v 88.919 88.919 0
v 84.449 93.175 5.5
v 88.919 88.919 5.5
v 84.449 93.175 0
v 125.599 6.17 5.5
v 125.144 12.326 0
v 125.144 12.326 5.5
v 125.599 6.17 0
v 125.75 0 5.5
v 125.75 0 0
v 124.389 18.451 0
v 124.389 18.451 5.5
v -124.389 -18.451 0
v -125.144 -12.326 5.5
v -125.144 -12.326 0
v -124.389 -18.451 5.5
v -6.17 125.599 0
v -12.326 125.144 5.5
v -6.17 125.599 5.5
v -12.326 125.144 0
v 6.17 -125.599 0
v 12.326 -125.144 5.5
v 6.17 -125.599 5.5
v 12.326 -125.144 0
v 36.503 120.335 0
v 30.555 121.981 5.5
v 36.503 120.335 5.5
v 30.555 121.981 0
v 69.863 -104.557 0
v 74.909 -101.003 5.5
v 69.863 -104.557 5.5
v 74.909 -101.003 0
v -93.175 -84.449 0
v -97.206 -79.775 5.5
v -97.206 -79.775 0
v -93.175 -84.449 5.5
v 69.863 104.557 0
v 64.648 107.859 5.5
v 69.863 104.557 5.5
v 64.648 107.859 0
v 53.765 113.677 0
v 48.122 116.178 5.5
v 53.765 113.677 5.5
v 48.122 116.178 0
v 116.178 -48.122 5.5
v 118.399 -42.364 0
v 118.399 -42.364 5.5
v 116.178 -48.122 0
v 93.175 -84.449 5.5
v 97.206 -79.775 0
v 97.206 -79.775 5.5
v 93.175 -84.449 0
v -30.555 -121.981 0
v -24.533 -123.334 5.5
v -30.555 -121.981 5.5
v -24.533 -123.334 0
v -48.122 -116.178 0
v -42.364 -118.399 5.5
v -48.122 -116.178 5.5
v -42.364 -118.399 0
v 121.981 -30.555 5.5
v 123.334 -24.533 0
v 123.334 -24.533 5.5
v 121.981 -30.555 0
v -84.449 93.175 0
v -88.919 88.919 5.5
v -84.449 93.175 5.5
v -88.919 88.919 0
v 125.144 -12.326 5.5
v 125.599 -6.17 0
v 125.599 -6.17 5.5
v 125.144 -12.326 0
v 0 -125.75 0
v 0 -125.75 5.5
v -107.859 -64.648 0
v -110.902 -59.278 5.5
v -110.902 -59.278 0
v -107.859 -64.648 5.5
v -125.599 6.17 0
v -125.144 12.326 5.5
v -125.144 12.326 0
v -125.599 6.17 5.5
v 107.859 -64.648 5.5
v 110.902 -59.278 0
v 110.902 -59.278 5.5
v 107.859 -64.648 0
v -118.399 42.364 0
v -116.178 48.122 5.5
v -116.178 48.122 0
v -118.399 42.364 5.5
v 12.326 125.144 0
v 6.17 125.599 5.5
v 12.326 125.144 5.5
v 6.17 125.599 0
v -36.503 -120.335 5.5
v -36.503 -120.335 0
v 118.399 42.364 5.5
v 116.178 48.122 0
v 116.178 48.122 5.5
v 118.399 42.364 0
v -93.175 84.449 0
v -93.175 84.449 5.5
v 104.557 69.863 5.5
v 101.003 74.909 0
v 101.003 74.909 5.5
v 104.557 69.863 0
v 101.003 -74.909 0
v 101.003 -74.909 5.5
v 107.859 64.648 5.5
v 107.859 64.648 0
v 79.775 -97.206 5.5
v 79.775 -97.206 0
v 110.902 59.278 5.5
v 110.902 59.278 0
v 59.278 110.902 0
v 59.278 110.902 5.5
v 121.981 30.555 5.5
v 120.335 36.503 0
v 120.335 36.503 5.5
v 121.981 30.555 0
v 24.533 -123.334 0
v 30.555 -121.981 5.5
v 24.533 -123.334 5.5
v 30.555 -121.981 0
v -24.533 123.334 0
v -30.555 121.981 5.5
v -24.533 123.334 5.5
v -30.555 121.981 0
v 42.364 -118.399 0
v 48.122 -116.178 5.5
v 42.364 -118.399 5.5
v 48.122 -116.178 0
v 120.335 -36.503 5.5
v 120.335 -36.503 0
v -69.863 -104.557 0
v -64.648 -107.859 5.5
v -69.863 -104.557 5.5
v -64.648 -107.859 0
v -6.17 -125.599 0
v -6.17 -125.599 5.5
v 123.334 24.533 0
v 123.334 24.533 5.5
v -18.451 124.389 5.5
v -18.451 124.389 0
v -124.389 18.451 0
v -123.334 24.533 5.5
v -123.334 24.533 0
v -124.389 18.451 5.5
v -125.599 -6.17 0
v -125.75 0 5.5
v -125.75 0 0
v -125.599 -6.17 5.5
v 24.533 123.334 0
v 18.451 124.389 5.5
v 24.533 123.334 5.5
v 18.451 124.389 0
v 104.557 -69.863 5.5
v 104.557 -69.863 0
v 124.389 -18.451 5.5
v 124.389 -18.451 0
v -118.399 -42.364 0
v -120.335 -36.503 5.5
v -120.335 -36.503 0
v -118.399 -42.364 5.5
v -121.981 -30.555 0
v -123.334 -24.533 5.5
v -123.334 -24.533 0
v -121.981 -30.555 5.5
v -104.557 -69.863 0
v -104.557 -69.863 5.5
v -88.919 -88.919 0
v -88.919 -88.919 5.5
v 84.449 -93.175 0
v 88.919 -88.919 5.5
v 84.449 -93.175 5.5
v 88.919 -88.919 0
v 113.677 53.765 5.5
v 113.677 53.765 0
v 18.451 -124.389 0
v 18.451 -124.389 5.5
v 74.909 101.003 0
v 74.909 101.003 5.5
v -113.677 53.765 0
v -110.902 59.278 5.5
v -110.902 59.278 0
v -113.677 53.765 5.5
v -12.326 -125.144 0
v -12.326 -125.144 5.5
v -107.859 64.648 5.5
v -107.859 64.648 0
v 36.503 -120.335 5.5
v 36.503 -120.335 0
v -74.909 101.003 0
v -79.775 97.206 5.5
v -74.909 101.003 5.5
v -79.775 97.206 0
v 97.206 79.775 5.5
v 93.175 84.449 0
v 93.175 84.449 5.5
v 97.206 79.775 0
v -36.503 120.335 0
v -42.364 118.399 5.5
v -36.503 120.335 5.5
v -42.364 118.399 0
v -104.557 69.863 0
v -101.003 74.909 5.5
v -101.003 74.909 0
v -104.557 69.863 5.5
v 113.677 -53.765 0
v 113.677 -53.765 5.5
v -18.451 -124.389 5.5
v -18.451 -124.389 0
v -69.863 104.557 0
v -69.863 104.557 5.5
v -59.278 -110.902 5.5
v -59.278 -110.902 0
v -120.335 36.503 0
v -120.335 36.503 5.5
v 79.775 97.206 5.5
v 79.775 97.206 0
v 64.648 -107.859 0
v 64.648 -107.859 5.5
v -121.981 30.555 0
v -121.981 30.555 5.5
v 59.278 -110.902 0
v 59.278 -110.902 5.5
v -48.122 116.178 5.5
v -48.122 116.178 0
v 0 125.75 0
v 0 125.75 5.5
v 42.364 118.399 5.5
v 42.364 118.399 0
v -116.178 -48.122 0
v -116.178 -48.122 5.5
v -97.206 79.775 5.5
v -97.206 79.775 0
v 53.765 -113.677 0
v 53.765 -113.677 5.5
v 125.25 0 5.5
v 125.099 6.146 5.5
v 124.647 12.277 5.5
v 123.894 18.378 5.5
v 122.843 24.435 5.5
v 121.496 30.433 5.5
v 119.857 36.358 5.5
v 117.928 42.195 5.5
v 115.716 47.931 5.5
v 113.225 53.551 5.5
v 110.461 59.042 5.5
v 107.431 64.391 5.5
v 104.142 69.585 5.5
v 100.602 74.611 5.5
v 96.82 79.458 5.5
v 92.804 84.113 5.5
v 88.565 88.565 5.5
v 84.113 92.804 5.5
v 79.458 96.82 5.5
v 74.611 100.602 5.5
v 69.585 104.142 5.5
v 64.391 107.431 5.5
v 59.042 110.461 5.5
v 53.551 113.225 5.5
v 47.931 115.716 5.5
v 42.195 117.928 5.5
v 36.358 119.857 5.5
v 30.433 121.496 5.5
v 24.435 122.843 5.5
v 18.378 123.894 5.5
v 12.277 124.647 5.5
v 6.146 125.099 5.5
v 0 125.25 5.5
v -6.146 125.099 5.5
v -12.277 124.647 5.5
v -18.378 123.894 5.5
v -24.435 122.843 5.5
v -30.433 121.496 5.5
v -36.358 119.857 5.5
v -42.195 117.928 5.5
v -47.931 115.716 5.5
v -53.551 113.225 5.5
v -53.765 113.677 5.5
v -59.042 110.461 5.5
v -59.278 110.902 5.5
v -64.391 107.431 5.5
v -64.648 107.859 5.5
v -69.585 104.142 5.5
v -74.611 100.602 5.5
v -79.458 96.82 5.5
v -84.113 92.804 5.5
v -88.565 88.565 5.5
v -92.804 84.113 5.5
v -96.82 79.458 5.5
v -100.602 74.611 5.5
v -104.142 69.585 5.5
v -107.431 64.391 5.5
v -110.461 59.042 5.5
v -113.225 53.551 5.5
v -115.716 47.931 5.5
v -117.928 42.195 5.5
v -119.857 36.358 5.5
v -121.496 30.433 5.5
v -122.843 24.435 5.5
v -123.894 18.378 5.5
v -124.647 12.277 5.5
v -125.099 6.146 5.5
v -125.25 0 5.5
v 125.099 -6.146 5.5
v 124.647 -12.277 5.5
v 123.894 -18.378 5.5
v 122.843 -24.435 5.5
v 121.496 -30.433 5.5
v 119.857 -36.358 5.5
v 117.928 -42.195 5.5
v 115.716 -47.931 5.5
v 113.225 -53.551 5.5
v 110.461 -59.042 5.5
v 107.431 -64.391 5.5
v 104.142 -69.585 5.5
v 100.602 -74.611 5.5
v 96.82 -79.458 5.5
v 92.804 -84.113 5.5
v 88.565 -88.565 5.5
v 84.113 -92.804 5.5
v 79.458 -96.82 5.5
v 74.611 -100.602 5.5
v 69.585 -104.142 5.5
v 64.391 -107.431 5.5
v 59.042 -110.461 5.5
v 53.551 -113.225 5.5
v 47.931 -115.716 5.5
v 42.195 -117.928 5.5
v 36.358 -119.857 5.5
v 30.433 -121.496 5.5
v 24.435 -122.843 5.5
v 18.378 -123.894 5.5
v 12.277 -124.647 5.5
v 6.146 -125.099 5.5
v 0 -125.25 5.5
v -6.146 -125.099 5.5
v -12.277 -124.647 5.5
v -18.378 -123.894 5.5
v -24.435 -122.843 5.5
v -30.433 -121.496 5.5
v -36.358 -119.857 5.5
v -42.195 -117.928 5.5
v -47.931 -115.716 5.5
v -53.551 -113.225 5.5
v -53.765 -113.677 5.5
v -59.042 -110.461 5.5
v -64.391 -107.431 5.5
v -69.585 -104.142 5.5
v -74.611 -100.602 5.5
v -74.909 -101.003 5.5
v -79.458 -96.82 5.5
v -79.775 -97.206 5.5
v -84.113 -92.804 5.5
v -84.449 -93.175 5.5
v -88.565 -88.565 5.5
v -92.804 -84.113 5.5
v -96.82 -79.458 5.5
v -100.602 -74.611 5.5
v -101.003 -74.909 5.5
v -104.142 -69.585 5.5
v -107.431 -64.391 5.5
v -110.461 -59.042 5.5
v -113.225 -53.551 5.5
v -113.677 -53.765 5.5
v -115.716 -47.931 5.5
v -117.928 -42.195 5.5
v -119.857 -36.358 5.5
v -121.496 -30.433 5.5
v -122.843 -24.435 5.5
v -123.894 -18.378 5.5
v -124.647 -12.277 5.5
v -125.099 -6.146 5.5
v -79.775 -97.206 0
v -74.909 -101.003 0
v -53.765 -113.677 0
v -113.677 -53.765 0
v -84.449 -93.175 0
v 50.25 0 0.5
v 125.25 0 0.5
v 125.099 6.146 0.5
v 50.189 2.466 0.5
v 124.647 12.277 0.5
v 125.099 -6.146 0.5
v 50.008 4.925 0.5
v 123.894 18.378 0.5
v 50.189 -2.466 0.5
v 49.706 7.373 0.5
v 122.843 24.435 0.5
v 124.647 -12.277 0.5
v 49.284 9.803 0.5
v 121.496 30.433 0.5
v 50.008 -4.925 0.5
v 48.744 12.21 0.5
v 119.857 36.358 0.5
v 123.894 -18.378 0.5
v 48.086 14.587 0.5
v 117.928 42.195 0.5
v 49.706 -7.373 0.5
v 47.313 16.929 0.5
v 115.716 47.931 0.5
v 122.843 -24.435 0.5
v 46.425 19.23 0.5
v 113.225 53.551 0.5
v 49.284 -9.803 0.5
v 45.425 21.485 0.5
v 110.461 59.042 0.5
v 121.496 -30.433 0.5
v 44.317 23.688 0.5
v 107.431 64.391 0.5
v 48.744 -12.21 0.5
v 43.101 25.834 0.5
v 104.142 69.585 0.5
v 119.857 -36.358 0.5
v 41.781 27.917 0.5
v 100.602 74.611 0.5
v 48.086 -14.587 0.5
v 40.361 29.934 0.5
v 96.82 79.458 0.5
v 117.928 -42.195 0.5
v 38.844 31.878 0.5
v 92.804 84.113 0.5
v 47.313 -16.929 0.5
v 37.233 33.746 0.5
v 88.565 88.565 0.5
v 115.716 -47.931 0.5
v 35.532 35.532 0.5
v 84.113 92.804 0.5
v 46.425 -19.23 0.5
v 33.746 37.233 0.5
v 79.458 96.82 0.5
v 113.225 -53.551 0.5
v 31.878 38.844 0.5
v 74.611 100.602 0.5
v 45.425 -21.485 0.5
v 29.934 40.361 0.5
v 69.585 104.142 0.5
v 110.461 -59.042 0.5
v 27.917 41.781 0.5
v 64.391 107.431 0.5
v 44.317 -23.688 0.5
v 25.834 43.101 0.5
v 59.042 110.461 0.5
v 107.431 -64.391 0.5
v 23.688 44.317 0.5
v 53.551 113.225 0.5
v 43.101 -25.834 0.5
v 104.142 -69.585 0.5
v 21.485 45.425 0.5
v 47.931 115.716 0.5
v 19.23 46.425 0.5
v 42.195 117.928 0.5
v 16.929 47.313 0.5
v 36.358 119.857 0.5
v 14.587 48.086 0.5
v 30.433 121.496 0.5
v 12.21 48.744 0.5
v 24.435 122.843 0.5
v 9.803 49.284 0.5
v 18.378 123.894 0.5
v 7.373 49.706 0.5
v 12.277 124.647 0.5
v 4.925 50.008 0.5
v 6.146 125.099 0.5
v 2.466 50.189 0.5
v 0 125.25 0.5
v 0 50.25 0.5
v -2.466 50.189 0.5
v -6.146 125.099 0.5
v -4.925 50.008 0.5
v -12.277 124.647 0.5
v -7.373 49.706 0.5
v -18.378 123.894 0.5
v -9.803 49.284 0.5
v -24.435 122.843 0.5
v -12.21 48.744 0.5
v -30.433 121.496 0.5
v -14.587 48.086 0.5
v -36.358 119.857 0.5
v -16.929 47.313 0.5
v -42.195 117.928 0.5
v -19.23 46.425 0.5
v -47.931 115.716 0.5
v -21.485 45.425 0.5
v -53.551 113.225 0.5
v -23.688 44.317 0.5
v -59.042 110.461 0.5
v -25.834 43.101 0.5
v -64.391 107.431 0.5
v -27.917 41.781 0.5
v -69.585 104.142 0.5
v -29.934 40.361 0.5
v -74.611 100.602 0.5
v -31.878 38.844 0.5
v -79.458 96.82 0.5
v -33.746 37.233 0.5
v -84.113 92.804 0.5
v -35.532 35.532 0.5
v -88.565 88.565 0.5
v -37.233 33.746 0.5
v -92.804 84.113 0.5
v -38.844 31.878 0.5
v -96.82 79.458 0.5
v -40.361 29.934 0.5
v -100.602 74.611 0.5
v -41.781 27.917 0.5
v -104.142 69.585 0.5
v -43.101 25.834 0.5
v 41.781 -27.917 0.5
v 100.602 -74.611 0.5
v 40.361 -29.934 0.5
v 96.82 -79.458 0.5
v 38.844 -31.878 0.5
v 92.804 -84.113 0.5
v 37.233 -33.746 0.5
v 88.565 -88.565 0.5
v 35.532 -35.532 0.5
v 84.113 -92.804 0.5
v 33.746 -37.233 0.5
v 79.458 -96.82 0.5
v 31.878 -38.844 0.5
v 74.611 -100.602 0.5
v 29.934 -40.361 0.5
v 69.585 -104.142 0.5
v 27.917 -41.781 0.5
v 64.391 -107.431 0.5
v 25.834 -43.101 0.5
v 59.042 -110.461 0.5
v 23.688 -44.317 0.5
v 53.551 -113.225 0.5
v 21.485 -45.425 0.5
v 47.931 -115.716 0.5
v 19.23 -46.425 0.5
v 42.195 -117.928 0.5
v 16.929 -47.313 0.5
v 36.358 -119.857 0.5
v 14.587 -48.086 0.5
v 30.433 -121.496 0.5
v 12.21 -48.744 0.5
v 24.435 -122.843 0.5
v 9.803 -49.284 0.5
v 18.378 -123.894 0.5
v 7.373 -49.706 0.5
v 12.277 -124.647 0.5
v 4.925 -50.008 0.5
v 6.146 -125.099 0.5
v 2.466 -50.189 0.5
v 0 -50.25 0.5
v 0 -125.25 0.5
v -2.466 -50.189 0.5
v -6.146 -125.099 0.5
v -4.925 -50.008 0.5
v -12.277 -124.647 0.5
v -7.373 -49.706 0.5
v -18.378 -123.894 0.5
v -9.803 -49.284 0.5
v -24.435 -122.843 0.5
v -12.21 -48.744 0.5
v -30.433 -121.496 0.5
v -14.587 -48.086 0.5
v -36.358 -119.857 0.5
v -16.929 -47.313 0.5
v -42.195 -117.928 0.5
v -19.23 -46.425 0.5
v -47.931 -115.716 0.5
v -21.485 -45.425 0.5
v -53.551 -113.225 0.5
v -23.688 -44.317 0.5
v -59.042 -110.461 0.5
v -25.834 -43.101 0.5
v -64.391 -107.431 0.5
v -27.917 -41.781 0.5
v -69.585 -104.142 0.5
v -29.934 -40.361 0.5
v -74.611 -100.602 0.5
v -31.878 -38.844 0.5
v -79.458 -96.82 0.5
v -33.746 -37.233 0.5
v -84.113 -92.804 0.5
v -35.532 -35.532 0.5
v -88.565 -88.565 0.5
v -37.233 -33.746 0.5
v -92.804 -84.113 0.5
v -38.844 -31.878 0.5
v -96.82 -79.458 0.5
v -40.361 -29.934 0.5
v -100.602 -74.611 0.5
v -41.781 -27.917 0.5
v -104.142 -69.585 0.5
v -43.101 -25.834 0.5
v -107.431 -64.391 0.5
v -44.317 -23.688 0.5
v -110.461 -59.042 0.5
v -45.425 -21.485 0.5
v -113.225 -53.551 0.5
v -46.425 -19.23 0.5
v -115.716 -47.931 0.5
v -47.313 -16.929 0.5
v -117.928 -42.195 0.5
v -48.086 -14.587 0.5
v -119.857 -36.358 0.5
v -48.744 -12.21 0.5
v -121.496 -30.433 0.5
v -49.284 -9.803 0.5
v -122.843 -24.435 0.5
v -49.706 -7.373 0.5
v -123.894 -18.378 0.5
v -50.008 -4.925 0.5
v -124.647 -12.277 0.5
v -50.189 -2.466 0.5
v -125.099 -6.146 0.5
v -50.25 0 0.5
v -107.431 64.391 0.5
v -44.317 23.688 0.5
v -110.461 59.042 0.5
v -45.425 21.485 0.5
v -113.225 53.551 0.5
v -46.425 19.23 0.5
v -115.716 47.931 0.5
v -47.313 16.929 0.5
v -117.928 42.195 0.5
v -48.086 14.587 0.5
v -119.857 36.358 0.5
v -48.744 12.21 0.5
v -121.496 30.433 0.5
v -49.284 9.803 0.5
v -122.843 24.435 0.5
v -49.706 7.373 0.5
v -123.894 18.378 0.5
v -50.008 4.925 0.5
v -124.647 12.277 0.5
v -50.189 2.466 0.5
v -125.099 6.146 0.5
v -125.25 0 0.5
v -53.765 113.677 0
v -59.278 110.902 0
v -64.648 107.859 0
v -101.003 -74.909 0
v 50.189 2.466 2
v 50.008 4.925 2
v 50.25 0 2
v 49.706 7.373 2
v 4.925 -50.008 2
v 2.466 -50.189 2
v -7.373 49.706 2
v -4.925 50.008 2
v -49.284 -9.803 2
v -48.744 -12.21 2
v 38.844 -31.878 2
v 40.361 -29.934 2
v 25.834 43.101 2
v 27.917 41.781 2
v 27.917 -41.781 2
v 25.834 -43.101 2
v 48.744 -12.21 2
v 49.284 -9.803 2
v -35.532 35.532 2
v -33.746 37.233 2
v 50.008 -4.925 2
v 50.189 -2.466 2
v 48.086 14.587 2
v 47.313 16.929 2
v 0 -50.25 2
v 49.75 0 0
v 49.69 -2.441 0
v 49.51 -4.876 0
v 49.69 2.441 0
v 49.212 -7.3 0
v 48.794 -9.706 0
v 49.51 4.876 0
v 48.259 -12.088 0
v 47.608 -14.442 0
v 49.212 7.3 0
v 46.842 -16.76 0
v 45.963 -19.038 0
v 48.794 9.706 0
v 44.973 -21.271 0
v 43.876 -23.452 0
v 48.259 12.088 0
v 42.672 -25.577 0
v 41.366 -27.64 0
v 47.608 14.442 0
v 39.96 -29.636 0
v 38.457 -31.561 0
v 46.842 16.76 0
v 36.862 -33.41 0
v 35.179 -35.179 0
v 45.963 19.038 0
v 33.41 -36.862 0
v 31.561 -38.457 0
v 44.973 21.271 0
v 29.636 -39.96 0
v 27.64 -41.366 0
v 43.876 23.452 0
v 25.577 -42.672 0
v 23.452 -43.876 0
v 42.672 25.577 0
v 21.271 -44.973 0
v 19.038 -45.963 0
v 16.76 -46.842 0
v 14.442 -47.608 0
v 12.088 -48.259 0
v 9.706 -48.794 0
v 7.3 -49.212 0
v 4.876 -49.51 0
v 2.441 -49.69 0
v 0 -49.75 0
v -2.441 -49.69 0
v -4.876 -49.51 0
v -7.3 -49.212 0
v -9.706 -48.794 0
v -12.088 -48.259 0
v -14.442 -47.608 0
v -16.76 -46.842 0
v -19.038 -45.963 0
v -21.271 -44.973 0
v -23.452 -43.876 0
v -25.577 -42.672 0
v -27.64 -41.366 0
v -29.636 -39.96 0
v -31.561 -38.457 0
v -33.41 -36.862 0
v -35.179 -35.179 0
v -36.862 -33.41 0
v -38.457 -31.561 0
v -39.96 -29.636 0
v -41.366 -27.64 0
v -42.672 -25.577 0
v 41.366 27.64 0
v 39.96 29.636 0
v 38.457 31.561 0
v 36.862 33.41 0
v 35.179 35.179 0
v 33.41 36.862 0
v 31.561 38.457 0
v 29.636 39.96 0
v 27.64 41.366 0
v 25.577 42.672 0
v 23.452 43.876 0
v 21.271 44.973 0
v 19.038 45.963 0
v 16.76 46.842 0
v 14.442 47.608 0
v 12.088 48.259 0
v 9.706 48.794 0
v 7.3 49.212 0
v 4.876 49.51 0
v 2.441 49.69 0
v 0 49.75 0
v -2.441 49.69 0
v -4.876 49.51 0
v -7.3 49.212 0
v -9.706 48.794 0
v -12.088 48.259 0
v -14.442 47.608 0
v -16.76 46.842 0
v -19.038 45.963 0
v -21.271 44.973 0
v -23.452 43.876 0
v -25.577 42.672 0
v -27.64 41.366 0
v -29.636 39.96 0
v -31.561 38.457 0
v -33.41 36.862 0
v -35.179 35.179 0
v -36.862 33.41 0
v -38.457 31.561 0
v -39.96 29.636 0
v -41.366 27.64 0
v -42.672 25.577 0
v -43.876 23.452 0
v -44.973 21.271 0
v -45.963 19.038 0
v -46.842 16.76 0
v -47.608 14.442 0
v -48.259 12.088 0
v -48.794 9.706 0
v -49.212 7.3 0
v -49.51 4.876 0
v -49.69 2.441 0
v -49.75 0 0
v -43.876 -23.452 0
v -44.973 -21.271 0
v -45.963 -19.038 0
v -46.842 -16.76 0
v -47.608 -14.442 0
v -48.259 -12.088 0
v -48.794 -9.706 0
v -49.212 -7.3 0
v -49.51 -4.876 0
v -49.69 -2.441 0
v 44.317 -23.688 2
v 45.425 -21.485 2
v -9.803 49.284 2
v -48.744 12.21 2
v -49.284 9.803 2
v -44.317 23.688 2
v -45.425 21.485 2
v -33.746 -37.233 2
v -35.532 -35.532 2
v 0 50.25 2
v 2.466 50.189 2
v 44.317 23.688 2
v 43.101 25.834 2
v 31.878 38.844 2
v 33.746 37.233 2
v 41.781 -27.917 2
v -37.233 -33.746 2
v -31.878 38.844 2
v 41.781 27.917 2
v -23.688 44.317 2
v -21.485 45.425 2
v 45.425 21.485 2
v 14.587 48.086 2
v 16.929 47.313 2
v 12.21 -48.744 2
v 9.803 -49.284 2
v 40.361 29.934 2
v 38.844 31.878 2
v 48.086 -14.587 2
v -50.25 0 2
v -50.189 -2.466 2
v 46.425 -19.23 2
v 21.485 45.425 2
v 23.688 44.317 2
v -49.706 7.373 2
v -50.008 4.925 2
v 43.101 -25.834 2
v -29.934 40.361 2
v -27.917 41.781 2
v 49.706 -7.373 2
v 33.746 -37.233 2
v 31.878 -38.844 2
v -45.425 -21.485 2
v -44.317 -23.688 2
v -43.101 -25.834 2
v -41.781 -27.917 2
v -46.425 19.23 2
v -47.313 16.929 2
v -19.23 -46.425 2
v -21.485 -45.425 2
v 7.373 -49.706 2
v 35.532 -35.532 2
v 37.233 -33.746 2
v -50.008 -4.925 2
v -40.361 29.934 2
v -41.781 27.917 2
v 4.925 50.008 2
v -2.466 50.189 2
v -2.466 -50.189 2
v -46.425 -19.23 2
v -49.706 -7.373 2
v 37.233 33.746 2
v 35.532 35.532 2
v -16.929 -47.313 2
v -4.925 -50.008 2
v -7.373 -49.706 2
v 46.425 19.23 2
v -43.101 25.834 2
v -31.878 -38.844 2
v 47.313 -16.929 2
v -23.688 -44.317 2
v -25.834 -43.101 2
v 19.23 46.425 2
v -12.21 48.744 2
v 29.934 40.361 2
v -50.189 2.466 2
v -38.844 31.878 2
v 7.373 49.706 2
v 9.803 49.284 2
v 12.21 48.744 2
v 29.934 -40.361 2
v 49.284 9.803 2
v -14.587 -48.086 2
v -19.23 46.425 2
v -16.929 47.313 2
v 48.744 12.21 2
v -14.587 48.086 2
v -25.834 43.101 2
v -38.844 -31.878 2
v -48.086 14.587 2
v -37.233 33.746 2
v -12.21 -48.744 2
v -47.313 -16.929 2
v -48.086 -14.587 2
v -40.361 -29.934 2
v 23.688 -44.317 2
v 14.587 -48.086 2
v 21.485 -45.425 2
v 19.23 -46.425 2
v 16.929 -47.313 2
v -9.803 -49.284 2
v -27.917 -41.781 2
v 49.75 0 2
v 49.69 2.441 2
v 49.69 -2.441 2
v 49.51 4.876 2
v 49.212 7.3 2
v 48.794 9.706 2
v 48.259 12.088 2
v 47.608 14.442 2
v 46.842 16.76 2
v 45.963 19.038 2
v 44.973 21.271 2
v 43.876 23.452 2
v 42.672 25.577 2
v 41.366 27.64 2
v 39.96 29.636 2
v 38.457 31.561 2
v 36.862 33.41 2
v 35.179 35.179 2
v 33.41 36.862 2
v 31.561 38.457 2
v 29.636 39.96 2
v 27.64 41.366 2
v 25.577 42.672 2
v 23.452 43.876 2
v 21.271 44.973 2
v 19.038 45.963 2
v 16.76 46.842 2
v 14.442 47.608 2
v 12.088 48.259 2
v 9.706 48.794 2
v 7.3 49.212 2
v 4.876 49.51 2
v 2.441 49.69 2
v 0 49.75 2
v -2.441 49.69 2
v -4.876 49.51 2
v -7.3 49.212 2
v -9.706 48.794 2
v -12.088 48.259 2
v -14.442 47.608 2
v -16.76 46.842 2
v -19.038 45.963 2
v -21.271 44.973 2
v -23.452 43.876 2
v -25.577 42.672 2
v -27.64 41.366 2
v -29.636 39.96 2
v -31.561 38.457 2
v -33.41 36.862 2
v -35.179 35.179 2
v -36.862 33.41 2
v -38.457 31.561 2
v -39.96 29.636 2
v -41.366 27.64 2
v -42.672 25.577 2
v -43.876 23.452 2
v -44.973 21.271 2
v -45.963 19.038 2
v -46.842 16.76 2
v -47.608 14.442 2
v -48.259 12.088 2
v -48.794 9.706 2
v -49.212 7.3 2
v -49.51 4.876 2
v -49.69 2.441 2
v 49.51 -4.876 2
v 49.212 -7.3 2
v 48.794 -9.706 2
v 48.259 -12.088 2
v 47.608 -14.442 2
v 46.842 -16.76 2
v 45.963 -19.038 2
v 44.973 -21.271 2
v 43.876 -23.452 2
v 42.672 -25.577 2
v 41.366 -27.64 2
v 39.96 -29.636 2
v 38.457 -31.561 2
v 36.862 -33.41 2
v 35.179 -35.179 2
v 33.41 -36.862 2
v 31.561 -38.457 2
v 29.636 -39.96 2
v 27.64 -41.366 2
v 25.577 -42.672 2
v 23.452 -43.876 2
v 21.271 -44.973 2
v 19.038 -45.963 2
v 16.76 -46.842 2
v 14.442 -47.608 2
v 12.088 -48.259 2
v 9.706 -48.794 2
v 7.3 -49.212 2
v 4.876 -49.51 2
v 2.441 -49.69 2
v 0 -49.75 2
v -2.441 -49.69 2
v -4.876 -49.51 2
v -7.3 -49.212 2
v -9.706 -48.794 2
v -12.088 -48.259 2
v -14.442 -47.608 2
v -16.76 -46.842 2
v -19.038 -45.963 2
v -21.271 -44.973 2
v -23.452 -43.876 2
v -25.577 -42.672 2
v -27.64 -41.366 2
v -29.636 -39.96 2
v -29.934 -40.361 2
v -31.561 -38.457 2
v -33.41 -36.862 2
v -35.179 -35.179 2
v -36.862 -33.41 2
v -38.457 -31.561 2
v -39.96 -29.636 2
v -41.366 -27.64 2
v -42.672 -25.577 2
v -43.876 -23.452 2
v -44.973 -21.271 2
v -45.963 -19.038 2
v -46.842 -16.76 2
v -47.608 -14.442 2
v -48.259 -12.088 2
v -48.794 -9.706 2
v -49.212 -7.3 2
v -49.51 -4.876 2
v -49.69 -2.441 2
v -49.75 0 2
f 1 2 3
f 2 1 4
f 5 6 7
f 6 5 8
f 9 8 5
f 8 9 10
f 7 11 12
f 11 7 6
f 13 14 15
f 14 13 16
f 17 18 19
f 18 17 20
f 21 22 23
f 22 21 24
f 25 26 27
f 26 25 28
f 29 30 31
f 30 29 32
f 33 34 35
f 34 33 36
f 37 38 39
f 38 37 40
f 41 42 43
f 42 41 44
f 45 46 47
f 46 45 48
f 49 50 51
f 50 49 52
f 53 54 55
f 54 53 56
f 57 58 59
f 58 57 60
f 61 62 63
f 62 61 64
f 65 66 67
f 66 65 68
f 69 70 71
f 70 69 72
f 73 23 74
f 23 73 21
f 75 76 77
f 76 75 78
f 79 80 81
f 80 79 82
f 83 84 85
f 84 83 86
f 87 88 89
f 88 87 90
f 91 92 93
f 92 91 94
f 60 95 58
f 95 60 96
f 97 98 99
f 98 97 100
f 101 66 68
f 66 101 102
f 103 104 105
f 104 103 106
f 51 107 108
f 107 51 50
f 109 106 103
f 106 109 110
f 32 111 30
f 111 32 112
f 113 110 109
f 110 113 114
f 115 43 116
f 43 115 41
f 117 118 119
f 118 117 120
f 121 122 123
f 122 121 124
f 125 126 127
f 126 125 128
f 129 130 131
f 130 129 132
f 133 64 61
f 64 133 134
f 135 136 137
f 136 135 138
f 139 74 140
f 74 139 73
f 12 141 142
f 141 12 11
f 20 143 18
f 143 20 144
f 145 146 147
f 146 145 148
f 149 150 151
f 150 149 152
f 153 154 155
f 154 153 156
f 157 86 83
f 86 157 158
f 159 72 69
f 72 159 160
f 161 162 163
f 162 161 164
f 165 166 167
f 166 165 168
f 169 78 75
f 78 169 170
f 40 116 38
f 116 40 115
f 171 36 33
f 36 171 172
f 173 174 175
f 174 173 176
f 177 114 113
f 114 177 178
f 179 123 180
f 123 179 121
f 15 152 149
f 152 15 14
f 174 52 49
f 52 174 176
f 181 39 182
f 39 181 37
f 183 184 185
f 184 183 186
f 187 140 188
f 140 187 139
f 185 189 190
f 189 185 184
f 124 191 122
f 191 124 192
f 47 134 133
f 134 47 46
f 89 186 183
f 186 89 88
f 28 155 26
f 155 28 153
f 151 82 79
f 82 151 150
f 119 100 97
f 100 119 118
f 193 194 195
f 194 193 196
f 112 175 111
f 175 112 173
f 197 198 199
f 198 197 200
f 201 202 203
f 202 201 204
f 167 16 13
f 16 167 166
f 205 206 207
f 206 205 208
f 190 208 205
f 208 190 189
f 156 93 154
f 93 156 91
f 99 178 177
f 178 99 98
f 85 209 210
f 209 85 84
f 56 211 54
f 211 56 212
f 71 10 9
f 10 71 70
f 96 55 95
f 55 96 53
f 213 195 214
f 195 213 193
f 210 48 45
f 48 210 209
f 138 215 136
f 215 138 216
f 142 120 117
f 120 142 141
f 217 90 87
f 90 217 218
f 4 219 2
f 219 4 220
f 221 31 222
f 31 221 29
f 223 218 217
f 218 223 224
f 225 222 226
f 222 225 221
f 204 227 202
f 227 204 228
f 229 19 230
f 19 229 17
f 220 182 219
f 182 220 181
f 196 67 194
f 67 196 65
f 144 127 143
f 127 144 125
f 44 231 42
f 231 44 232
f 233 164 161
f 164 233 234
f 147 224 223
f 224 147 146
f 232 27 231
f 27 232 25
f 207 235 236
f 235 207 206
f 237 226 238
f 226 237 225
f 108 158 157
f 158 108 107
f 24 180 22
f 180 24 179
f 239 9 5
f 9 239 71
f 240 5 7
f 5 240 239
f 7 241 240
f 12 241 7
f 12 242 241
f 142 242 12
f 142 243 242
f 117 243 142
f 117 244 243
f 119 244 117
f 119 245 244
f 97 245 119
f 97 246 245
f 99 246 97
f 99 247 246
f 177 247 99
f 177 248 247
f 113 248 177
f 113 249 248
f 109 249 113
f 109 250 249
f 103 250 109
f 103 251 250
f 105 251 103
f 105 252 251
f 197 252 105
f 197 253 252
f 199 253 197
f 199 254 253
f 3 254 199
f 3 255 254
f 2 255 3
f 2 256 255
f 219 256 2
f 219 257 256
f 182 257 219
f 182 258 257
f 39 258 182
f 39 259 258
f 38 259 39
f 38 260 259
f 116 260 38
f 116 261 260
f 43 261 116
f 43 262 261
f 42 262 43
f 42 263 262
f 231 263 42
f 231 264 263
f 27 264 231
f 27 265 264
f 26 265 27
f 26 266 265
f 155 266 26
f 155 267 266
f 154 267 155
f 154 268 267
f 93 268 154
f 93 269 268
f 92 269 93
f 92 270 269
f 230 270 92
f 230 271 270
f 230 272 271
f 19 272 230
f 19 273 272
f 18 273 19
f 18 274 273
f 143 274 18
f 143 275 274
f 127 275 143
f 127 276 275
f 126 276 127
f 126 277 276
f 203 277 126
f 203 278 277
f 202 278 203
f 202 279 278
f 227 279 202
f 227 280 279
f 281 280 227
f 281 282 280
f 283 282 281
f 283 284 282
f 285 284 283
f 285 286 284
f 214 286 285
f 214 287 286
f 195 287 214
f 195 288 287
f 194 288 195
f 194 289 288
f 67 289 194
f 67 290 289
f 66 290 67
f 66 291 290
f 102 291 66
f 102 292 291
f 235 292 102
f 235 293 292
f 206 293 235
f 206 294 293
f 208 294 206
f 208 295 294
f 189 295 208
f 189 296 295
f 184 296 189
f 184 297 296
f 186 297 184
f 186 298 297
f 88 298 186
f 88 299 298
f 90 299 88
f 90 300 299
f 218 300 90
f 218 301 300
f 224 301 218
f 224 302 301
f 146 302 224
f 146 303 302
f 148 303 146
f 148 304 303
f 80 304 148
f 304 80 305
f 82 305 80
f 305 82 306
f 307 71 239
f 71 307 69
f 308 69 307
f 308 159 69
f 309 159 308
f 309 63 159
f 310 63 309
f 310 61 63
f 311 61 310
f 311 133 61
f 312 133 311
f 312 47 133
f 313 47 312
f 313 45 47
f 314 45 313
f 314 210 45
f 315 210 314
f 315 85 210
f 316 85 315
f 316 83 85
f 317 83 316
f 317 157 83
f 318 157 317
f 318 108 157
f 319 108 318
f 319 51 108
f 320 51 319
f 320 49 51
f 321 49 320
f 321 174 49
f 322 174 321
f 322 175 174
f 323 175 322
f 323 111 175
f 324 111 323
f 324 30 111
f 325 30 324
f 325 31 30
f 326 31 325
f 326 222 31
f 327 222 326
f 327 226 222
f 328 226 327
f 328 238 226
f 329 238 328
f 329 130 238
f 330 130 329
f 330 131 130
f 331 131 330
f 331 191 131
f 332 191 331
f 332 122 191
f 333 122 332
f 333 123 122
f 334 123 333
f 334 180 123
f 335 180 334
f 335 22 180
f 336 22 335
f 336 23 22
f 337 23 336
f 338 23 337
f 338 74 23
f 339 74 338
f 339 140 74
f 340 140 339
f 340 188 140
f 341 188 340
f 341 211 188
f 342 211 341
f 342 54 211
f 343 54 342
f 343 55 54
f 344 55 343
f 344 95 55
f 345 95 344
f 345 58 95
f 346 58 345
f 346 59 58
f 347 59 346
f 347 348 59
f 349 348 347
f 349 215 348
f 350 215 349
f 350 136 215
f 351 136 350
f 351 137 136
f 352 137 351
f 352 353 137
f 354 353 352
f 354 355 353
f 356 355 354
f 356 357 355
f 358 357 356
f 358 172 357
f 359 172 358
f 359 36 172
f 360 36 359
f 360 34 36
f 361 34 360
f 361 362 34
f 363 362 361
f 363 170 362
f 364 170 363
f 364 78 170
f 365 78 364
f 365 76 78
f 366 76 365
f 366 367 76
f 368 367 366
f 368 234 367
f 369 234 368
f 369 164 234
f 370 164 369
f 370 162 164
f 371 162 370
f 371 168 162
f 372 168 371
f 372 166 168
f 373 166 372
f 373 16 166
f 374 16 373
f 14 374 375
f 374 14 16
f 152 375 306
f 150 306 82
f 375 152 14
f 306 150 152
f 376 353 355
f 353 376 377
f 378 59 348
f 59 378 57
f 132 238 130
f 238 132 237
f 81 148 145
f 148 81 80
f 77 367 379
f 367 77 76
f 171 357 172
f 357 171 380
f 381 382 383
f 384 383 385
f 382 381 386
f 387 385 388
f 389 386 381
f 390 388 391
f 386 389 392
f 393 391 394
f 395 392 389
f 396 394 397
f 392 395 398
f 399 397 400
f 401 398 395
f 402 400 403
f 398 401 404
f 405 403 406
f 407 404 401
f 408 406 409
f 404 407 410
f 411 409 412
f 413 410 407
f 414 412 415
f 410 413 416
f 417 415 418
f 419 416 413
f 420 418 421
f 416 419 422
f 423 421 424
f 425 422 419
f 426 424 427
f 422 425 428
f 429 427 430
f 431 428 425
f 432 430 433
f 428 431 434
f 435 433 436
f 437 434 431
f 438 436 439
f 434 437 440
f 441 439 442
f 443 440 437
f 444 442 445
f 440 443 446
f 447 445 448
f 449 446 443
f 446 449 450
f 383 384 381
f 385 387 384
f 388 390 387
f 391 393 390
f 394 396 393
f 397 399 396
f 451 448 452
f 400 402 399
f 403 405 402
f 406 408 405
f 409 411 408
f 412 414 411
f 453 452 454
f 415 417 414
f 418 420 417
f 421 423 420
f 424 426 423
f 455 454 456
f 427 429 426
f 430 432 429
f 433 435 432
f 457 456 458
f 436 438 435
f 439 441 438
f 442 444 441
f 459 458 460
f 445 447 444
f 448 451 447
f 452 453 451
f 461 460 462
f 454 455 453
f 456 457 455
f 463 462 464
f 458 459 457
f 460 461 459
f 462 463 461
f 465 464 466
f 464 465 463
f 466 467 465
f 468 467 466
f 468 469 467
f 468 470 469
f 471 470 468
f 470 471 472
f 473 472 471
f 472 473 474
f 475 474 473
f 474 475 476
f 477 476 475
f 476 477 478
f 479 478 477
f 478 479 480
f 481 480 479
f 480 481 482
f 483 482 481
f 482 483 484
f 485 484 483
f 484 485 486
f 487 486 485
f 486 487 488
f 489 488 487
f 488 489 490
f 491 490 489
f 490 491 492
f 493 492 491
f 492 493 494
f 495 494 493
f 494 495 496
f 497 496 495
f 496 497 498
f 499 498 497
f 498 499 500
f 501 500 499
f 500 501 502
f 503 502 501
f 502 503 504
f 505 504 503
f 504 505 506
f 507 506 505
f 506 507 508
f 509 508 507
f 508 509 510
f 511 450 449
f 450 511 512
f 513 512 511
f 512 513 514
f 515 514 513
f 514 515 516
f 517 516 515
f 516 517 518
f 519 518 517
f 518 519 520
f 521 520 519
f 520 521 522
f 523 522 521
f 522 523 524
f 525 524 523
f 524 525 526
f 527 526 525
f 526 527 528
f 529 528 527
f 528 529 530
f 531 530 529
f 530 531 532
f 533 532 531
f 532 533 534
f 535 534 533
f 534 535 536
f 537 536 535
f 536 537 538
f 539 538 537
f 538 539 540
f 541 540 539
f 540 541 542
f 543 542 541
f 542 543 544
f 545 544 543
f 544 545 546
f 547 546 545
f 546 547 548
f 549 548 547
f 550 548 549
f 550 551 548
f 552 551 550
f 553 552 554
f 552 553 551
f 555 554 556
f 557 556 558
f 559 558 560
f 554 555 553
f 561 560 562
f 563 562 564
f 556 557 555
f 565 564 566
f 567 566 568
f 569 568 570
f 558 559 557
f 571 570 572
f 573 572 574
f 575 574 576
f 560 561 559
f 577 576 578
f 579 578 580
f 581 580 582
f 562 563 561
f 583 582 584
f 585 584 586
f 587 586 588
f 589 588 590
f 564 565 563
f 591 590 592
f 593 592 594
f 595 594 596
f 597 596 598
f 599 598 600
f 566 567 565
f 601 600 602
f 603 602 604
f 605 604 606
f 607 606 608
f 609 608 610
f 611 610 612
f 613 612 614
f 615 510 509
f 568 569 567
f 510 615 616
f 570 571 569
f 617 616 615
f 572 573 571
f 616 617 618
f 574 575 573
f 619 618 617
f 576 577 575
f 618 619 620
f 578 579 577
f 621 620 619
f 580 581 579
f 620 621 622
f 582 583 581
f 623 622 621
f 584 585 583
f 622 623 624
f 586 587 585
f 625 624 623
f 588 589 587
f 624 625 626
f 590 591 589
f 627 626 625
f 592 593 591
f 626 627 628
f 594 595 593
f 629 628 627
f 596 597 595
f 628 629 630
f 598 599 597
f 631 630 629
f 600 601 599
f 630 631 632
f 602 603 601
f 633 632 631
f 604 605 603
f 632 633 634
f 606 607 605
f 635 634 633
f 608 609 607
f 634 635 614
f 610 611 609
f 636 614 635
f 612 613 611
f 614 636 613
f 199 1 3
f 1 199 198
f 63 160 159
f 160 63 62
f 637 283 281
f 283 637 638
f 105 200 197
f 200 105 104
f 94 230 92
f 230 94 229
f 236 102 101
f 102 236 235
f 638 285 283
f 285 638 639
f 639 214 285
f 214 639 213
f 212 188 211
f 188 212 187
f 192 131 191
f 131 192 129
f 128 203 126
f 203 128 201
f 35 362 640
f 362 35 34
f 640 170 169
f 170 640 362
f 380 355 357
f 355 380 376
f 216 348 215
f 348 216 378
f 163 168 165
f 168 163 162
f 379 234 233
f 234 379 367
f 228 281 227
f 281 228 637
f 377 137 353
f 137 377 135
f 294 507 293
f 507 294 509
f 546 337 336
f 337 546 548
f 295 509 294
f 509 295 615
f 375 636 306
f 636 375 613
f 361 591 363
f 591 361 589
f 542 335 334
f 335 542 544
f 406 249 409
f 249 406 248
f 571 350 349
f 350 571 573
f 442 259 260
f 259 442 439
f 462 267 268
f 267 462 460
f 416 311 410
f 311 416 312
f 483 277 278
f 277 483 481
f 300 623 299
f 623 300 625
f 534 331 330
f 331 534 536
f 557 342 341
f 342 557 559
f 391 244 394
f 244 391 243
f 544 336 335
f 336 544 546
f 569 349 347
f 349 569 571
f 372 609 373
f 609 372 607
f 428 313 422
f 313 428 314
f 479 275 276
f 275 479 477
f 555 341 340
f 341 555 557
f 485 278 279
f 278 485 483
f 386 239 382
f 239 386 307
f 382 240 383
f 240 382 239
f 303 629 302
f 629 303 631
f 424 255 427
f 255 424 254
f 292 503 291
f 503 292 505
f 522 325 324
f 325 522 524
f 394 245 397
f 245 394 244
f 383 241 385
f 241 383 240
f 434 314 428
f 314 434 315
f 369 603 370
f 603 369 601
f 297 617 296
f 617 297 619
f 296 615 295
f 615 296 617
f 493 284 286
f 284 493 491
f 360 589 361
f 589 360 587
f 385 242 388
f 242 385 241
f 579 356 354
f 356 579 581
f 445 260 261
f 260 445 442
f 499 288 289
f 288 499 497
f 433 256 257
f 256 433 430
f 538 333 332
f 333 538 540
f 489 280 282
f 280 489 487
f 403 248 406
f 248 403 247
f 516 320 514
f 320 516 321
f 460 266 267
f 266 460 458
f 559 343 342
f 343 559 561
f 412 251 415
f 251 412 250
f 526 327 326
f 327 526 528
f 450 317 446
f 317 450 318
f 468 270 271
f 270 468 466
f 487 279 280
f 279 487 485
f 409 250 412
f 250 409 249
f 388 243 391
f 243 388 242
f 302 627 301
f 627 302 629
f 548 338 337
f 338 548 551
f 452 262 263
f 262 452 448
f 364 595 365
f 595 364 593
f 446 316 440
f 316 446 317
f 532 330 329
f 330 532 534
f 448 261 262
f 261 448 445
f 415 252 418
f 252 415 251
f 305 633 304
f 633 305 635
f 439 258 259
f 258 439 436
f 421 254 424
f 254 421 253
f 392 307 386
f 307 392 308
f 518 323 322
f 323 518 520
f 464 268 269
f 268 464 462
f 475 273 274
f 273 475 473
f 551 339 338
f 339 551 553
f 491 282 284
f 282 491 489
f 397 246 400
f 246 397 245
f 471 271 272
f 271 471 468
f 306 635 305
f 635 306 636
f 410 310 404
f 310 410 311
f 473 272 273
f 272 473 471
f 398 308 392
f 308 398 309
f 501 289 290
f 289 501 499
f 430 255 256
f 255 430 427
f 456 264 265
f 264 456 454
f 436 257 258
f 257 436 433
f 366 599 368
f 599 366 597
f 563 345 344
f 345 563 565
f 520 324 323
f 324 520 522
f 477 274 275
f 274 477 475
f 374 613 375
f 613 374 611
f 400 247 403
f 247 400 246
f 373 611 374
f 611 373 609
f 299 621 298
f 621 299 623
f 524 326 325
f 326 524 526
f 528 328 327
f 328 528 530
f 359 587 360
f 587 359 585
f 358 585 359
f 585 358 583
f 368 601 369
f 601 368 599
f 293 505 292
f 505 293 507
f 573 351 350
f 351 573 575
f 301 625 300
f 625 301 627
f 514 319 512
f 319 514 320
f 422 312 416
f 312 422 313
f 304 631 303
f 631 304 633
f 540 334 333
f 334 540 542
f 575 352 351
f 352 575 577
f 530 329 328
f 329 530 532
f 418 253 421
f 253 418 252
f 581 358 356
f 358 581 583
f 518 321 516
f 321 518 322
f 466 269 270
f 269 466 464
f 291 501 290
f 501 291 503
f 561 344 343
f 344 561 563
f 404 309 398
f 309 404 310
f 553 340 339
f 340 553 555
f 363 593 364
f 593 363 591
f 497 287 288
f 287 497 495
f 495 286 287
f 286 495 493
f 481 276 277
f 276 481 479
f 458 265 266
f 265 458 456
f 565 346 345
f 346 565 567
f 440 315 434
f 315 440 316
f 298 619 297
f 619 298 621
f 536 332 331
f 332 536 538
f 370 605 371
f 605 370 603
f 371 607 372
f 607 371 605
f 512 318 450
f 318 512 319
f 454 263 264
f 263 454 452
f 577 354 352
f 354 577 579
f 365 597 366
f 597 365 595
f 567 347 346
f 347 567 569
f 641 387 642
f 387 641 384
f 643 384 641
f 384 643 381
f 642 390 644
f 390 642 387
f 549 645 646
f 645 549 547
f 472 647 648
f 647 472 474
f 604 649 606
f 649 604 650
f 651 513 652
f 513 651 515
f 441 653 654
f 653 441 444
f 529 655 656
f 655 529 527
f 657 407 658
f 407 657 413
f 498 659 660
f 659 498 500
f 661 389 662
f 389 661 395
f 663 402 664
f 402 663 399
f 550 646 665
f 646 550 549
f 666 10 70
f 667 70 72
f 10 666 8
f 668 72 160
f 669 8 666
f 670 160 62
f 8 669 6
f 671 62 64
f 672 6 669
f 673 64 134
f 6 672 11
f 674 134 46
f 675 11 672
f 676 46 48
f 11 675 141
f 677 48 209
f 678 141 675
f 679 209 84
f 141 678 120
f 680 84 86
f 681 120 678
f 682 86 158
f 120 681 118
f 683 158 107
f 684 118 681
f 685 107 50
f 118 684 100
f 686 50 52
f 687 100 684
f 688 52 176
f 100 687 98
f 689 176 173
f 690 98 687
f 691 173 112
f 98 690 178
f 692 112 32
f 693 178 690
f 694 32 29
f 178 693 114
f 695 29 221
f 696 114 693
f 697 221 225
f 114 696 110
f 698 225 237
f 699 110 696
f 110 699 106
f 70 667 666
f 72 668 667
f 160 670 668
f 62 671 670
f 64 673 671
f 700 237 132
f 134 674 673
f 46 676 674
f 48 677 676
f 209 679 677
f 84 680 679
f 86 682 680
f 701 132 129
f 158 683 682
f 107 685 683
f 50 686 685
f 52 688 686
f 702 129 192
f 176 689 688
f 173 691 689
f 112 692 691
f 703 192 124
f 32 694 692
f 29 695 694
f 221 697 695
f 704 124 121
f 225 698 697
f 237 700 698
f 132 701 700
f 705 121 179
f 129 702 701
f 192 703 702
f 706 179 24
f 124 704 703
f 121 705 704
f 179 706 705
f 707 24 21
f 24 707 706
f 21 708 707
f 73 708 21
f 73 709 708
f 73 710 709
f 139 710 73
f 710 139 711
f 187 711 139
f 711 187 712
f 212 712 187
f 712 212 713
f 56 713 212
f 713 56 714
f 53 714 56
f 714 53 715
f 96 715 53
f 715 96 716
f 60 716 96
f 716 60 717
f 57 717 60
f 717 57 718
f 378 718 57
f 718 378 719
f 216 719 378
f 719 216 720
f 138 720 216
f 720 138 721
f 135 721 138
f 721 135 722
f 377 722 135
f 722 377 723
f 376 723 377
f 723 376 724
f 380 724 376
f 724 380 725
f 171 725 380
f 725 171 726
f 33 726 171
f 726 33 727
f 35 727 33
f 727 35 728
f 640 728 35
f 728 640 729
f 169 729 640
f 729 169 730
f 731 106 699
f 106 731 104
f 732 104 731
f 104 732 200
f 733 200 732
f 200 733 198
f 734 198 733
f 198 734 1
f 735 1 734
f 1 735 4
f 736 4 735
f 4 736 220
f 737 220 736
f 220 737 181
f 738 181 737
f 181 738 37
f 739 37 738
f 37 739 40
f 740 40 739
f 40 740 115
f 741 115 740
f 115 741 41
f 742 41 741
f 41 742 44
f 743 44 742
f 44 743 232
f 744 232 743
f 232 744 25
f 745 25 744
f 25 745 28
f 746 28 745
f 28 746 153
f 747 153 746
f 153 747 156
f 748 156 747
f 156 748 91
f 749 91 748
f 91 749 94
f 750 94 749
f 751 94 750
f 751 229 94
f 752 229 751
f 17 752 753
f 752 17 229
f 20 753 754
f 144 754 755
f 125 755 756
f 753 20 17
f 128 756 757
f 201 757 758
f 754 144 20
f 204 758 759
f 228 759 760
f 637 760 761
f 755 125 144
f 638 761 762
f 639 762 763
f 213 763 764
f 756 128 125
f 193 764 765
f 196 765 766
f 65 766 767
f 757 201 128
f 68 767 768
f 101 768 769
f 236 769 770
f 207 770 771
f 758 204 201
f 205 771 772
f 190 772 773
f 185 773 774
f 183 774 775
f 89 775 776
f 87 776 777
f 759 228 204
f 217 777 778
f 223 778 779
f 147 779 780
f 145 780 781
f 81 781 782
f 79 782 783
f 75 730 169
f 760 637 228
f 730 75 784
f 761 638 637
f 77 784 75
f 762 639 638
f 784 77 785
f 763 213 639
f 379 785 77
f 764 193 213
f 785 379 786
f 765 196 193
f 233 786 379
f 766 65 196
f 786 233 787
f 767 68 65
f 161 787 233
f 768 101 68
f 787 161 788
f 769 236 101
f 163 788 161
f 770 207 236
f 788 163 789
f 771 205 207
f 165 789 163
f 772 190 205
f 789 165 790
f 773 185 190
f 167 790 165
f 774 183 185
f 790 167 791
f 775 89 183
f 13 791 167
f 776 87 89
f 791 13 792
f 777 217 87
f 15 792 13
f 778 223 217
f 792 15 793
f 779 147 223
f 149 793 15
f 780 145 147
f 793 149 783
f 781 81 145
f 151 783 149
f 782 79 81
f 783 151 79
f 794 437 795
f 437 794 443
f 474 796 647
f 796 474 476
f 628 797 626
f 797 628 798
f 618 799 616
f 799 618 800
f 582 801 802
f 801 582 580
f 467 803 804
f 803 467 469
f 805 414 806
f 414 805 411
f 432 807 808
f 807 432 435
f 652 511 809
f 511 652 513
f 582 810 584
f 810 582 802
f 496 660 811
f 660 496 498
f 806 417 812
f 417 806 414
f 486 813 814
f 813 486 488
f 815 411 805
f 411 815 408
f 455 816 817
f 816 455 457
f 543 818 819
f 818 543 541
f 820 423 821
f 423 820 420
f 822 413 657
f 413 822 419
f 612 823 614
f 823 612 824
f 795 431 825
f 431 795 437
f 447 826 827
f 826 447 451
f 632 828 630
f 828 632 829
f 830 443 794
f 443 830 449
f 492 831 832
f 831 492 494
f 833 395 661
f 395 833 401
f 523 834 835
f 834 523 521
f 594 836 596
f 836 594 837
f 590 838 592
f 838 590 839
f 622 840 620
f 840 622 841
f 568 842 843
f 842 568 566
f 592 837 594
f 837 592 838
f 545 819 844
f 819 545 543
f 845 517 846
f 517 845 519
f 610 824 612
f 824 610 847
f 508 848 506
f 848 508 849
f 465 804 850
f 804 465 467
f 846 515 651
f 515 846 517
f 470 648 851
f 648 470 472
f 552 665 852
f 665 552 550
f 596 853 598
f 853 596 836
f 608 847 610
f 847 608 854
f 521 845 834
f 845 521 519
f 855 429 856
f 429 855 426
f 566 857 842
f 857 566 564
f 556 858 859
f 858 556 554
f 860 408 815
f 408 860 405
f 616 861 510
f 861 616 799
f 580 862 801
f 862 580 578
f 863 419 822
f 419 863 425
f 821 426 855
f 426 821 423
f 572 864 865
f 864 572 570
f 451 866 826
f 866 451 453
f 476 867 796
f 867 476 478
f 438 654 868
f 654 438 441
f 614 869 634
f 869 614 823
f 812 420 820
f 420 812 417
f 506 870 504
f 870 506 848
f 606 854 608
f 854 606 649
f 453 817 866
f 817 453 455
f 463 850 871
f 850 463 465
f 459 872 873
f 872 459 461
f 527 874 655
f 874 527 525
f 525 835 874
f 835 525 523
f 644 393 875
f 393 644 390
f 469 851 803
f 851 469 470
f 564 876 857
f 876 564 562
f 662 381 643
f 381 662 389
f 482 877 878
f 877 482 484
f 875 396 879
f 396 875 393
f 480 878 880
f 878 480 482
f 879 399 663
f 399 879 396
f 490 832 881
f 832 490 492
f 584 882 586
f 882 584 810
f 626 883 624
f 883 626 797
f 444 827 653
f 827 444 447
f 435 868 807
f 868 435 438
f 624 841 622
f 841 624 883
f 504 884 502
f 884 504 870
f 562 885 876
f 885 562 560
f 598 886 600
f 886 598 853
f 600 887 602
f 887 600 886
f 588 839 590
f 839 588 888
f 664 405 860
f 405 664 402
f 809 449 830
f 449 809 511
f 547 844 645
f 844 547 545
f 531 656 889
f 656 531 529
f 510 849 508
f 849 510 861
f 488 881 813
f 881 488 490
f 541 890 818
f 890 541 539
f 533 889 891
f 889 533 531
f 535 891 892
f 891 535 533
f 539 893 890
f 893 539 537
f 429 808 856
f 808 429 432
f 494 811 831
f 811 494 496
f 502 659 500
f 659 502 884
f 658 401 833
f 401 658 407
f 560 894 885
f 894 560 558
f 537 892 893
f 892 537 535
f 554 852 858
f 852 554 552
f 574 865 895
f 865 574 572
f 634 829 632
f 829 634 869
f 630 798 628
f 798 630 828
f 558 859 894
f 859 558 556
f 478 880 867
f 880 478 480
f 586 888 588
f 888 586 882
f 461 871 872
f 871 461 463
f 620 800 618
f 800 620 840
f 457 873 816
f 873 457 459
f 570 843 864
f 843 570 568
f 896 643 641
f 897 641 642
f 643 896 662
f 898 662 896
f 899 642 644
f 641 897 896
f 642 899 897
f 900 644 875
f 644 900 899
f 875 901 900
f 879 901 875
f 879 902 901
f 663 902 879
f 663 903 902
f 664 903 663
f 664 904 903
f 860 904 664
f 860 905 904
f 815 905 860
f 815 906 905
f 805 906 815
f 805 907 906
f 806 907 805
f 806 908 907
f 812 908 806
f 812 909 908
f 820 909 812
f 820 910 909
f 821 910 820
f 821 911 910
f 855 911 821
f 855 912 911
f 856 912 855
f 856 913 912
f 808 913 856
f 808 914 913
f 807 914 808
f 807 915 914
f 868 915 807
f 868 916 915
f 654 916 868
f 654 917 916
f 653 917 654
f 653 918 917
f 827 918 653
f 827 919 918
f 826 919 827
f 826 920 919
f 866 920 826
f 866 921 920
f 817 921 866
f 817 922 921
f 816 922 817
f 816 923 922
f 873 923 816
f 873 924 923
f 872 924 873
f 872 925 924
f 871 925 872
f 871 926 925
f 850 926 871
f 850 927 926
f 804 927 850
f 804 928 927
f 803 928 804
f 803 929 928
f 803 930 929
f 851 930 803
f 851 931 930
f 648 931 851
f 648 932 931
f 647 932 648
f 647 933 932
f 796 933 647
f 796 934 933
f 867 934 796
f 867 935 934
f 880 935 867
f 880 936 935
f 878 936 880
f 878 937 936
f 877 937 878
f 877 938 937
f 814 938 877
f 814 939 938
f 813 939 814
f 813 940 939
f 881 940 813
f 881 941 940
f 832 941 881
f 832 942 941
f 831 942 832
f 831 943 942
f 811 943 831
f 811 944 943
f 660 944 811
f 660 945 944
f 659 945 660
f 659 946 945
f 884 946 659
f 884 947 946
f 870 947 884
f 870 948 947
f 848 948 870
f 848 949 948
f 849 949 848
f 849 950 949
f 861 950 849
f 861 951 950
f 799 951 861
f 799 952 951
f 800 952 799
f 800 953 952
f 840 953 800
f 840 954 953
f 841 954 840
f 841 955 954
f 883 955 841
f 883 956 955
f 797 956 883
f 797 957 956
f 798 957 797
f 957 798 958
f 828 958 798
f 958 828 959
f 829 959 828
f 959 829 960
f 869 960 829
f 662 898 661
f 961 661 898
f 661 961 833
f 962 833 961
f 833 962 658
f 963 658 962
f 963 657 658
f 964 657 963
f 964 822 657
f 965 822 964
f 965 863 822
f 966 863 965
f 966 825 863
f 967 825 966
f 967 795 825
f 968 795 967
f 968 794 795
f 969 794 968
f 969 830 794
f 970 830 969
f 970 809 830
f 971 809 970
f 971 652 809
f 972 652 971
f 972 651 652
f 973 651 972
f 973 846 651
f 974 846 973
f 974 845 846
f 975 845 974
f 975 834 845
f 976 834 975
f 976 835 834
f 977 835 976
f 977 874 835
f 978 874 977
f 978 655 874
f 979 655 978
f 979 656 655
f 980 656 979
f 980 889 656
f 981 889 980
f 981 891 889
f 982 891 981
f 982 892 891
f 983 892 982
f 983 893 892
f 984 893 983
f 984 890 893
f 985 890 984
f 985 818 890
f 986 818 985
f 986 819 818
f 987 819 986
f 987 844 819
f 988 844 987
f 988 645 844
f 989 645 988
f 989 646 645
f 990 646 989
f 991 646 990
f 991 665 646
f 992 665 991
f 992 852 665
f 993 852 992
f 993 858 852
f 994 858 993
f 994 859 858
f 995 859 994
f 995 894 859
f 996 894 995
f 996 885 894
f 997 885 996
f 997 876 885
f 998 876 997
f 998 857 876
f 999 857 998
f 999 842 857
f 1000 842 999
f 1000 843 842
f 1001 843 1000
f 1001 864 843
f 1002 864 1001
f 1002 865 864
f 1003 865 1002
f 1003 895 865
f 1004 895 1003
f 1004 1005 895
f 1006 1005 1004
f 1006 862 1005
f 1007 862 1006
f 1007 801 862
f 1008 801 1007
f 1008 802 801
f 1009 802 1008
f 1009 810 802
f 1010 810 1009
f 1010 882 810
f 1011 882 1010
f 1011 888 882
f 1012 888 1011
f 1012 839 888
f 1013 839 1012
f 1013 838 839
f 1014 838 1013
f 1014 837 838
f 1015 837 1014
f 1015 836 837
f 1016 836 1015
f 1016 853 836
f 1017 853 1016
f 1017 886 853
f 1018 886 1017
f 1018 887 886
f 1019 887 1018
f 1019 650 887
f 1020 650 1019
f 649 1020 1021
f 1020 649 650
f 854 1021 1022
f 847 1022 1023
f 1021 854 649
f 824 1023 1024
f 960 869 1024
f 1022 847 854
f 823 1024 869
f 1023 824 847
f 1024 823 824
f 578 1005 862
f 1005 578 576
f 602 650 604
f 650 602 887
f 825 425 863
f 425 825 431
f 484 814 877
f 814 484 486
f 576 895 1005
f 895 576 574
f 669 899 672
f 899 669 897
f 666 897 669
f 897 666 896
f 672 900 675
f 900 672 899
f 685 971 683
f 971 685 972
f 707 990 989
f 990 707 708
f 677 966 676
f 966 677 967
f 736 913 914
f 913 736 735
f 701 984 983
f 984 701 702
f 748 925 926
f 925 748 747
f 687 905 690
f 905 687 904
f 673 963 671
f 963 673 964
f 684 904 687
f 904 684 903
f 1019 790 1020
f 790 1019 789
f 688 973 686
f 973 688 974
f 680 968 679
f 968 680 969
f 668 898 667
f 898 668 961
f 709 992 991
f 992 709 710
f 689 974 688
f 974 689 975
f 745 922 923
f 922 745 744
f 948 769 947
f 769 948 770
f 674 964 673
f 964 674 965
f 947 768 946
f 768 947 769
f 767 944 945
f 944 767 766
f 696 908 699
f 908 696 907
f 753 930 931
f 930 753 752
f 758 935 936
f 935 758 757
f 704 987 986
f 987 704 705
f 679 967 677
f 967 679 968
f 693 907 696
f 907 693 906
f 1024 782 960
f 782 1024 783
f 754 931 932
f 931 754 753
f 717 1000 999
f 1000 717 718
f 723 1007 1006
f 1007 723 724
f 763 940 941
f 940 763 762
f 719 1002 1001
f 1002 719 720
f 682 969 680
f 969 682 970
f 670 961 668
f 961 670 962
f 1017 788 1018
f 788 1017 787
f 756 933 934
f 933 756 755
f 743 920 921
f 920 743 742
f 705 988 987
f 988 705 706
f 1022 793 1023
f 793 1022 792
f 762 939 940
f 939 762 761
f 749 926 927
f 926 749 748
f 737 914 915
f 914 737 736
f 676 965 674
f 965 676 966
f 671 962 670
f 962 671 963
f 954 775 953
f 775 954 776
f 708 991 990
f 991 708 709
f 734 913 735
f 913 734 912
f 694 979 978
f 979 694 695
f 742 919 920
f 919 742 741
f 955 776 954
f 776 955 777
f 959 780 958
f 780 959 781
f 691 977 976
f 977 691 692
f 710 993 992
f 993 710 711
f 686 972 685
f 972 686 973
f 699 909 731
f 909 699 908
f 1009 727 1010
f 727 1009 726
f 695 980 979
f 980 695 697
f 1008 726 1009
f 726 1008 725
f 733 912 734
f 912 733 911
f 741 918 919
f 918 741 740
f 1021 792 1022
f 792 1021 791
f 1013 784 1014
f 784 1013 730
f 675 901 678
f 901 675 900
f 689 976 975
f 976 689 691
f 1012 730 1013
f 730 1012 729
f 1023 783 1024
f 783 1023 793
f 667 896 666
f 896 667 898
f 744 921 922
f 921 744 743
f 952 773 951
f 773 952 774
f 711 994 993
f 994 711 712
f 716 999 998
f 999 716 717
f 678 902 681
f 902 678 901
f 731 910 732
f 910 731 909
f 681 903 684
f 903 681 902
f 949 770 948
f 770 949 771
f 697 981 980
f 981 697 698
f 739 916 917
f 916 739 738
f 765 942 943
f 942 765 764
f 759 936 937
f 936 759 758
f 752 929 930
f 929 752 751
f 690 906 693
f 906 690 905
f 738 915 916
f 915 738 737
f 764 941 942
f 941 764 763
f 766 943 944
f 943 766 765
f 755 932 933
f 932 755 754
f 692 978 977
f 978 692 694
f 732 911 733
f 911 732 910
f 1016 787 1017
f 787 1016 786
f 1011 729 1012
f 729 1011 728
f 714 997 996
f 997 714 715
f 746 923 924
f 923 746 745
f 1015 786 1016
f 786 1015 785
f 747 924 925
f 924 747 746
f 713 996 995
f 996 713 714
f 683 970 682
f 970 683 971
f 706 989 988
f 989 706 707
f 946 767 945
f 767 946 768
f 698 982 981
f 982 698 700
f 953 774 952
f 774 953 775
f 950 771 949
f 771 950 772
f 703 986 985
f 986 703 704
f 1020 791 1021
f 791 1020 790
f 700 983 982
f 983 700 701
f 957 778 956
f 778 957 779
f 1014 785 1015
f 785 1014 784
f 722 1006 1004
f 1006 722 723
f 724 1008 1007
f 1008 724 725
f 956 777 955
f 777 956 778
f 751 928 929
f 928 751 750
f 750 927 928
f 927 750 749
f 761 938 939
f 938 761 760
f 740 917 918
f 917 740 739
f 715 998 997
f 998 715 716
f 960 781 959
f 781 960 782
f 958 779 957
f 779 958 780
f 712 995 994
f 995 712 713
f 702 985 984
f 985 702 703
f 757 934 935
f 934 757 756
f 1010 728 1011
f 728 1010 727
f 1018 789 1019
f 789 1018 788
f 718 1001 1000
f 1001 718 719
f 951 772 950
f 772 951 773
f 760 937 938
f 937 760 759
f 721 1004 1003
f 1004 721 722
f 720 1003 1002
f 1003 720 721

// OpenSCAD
module render()
{
  fn = 128;
  thickness = 0.5;
  expansion_fudge = 0.5;
  outer_radius = (250.0 +
                  thickness*2.0 +
                  expansion_fudge) / 2.0;
  outer_height = 5;
  inner_radius = 100.5 / 2.0;
  inner_height = 2;
  
  difference() {
    union() {
      cylinder(h = thickness,
               r1 = outer_radius,
               r2 = outer_radius, $fn=fn);
      translate([0, 0, thickness])
      difference() {
        cylinder(h = outer_height,
                 r1 = outer_radius,
                 r2 = outer_radius, $fn=fn);
        cylinder(h = outer_height,
                 r1 = outer_radius-thickness,
                 r2 = outer_radius-thickness, $fn=fn);
      }
      difference() {
        cylinder(h = inner_height,
                 r1 = inner_radius,
                 r2 = inner_radius, $fn=fn);
        cylinder(h = inner_height,
                 r1 = inner_radius-thickness,
                 r2 = inner_radius-thickness, $fn=fn);
      }
    }
    cylinder(h = inner_height,
             r1 = inner_radius-thickness,
             r2 = inner_radius-thickness, $fn=fn);
  }
}

echo(version=version());

render();
